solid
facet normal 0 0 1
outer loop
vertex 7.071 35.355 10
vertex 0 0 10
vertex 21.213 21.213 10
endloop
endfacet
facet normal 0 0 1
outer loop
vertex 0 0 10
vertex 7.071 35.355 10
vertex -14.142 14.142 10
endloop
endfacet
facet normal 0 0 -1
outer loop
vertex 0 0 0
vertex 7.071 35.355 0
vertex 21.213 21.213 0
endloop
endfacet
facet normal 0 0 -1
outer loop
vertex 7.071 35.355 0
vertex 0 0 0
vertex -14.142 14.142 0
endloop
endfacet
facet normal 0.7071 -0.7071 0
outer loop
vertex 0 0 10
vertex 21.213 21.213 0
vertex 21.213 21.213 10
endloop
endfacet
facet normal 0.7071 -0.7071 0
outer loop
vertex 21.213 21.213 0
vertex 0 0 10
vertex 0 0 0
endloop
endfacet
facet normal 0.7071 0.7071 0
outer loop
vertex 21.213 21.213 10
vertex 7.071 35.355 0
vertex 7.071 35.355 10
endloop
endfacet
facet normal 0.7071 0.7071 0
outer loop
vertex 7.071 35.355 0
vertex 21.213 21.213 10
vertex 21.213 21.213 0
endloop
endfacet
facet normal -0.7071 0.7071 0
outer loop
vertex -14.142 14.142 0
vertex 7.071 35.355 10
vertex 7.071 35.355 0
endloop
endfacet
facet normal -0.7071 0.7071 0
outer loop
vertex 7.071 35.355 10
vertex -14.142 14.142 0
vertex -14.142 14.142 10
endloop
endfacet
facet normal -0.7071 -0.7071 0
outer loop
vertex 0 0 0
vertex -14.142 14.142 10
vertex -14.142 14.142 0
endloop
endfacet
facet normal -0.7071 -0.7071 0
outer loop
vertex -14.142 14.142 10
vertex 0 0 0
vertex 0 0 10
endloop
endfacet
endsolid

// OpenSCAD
rotate([0, 0, 45]) cube([30, 20, 10]);
%cube([30, 20, 10]);
